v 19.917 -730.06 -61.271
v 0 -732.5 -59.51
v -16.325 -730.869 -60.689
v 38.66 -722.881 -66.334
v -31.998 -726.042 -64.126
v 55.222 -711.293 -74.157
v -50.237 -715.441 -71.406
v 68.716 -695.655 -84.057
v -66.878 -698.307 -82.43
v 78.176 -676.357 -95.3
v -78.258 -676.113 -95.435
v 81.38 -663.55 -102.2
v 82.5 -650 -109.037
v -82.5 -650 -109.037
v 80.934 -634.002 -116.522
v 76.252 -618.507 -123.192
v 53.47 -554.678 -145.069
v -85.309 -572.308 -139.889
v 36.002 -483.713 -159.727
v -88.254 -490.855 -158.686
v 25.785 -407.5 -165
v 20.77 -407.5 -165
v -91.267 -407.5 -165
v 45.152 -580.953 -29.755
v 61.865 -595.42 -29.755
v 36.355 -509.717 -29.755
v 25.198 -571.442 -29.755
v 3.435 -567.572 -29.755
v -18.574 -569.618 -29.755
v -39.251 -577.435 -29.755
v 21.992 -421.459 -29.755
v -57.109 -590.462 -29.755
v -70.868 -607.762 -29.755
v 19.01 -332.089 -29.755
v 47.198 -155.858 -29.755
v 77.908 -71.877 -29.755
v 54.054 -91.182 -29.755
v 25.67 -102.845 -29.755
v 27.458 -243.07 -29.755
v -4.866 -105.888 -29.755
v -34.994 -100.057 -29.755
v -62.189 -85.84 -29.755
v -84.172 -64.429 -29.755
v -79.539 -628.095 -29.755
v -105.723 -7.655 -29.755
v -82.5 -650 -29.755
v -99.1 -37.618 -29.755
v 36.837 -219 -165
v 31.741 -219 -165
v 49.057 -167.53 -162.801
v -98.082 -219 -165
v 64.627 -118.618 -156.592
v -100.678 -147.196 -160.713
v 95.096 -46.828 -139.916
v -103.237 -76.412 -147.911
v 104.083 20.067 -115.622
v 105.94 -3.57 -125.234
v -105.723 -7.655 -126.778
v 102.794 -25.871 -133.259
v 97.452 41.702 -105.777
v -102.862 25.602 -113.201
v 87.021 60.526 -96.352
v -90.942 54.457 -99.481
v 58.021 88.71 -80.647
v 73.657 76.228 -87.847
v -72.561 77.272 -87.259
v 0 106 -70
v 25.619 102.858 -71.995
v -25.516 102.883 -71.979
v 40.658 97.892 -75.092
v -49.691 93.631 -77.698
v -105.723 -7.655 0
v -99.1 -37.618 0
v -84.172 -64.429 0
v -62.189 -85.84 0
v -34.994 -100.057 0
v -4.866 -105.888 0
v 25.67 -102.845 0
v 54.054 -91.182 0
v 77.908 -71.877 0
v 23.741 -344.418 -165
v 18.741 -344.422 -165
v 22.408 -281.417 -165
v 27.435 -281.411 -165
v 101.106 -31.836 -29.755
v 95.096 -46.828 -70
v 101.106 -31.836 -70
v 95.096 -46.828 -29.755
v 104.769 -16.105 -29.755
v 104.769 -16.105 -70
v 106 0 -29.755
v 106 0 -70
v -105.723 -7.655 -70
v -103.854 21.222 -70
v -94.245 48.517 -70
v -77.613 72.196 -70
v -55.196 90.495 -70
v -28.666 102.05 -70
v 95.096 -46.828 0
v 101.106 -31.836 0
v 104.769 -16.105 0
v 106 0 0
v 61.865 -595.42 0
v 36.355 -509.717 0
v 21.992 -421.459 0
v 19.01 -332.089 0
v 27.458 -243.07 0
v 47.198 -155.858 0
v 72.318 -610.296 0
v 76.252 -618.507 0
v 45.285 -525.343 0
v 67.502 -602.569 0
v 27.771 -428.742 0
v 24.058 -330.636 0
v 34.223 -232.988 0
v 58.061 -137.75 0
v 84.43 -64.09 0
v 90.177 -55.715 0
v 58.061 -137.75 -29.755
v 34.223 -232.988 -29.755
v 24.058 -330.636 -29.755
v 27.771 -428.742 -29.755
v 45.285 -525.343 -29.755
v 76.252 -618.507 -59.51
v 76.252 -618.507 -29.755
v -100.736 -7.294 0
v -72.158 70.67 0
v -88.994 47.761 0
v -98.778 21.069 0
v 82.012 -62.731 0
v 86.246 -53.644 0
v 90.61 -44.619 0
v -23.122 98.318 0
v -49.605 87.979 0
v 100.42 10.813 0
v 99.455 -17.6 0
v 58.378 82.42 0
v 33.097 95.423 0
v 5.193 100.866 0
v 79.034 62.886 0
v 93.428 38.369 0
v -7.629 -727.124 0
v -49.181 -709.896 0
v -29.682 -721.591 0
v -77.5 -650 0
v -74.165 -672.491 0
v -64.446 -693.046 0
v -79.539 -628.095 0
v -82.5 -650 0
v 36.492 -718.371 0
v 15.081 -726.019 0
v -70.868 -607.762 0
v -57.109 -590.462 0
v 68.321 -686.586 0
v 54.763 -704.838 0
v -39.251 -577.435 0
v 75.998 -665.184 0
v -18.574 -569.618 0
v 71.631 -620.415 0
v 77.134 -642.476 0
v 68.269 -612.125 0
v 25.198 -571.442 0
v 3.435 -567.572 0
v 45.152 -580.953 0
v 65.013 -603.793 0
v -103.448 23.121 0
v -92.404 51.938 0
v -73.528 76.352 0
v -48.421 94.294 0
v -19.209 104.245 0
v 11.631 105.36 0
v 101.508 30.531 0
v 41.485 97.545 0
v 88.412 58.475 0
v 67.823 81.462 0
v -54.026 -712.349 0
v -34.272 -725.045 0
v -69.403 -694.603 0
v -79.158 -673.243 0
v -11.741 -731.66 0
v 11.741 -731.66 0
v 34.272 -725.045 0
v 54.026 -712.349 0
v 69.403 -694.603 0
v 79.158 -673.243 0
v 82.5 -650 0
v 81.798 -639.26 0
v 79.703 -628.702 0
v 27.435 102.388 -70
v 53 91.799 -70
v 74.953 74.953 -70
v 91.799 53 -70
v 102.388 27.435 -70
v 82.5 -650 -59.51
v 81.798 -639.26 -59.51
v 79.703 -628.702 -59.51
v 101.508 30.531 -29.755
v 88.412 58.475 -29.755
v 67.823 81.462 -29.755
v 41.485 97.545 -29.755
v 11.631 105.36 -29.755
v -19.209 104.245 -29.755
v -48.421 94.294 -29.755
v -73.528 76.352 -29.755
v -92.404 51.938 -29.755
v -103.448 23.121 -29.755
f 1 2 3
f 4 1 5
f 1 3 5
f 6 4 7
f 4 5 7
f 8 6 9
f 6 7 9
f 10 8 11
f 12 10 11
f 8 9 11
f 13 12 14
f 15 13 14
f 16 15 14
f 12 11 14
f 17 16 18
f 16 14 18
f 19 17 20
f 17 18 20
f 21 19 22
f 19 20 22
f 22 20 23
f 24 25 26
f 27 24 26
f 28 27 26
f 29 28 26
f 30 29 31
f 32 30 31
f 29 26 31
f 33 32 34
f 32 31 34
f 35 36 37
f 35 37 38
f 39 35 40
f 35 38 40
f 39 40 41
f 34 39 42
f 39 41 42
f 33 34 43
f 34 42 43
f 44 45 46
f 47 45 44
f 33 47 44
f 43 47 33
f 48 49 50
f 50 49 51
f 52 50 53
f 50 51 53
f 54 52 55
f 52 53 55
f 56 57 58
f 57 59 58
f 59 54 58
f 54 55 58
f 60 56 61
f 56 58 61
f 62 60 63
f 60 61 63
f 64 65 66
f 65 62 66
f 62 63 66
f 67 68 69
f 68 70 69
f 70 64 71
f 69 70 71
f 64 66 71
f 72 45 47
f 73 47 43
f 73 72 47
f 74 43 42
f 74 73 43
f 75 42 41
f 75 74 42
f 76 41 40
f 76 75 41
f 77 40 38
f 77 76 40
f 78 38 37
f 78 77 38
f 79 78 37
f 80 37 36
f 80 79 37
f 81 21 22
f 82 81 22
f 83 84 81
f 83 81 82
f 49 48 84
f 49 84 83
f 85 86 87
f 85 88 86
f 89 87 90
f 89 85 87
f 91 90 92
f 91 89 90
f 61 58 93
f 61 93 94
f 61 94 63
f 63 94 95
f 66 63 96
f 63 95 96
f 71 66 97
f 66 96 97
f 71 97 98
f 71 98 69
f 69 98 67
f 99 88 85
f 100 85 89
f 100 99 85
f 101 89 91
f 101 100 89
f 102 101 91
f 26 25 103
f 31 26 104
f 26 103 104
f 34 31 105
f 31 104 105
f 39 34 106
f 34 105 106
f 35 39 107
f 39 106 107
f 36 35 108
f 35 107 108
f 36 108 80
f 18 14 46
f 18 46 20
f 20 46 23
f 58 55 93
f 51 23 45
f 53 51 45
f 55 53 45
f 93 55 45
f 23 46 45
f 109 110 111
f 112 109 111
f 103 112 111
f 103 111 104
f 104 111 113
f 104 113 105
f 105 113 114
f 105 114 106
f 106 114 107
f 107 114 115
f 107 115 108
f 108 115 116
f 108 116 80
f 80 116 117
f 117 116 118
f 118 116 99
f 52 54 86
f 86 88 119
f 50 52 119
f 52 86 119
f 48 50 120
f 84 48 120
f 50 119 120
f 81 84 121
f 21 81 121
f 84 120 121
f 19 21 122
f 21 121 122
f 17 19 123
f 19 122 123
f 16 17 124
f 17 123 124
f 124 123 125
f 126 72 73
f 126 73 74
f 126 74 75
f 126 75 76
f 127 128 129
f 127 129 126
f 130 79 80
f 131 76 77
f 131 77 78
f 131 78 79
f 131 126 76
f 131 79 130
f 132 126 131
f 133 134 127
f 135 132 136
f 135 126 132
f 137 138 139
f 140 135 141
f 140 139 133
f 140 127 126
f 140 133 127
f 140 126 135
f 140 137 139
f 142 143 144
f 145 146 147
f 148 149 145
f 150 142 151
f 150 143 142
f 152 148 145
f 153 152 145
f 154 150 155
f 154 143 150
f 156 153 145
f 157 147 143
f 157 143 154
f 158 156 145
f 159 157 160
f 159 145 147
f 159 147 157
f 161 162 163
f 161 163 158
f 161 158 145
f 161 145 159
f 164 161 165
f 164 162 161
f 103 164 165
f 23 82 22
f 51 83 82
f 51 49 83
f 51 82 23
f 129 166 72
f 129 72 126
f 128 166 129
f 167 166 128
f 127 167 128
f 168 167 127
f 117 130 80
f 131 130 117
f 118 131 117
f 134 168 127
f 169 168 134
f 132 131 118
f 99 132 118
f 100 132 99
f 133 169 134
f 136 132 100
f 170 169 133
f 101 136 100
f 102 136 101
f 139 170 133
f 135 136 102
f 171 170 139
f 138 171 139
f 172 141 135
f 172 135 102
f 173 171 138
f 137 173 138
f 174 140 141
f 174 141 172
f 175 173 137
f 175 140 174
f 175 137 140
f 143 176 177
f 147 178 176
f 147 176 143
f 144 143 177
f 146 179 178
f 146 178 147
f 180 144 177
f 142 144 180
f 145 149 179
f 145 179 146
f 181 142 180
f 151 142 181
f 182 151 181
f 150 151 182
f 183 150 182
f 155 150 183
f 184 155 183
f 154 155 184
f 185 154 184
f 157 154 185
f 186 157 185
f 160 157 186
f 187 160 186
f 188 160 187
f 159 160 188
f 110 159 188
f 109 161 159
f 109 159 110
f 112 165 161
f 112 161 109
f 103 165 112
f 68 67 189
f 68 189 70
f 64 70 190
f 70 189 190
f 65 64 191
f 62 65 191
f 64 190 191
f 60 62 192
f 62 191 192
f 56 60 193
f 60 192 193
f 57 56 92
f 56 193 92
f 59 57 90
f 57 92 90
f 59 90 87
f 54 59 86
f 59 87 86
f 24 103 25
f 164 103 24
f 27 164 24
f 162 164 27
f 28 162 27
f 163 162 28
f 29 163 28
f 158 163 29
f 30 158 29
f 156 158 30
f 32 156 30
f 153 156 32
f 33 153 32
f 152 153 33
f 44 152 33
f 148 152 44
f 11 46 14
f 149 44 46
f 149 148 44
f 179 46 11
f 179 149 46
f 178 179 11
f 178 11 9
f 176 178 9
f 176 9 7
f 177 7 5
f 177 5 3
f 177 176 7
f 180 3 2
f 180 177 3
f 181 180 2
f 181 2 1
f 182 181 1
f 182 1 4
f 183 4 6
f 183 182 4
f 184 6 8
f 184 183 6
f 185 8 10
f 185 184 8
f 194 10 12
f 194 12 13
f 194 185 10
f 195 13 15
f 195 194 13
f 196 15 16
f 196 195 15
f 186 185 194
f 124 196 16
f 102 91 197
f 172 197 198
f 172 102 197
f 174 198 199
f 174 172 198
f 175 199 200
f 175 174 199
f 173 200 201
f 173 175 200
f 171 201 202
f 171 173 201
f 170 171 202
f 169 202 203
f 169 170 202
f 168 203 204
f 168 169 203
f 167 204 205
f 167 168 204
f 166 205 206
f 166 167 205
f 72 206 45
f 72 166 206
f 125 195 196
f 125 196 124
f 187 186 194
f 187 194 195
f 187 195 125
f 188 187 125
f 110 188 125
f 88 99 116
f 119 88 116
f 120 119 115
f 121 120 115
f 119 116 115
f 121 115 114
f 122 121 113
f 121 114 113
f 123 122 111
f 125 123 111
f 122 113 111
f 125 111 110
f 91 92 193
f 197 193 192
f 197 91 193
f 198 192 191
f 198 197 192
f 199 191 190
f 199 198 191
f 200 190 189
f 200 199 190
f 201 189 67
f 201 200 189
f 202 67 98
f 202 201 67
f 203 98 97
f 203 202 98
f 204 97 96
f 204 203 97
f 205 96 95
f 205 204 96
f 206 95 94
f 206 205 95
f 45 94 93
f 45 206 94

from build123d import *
from build123d.topology import SkipClean

# Parameters (mm, degrees)
SKETCH_1_R               = 106
EXTRUDE_1_DEPTH          = 70
SKETCH_2_R               = 82.5
EXTRUDE_2_DEPTH          = 59.51
EXTRUDE_2_2_DEPTH        = 165
EXTRUDE_3_DEPTH          = 135.245
CUT_EXTRUDE_1_DEPTH      = 759.298918633
CUT_EXTRUDE_1_DEPTH_BACK = 759.298918633


with BuildPart() as part:
    # 草圖1 → 填料-伸長1 (new body)
    with BuildSketch(Plane.XY):
        Circle(SKETCH_1_R)
    extrude(amount=-EXTRUDE_1_DEPTH)



with BuildPart() as body_2:
    # 草圖2 → Extrude 2 (new body)
    with BuildSketch(Plane.XY):
        with Locations((0, -650)):
            Circle(SKETCH_2_R)
    extrude(amount=-EXTRUDE_2_DEPTH)


with BuildPart() as part_1:
    with SkipClean():  # the faces are left unmerged after this step: merging them gives an invalid solid
        add(part.part)

        add(body_2.part)  # Extrude 2 2 merges body 2
        # 草圖5 → Extrude 2 2 (add)
        with BuildSketch(Plane.XY):
            with BuildLine():
                ThreePointArc((-105.723256406, -7.654610039), (20.294582586, 104.039078801), (95.095556669, -46.827717239))
                ThreePointArc((95.095556669, -46.827717239), (24.058429711, -330.636348878), (76.252402834, -618.506809274))
                ThreePointArc((76.252402834, -618.506809274), (16.053453931, -730.923028965), (-82.5, -650))
                Line((-82.5, -650), (-77.5, -650))
                ThreePointArc((-77.5, -650), (15.080517329, -726.018602967), (71.631045086, -620.4154875))
                ThreePointArc((71.631045086, -620.4154875), (19.06114358, -330.471632986), (90.609917204, -44.618862652))
                ThreePointArc((90.609917204, -44.618862652), (19.337290954, 99.131575084), (-100.736310349, -7.293543528))
                Line((-100.736310349, -7.293543528), (-105.723256406, -7.654610039))
            make_face()
        extrude(amount=-EXTRUDE_2_2_DEPTH)

    # 草圖6 → 填料-伸長3 (add)
    with BuildSketch(Plane.XY.offset(-29.755)):
        with BuildLine():
            Line((-82.5, -650), (-105.723256406, -7.654610039))
            ThreePointArc((-105.723256406, -7.654610039), (20.294582586, 104.039078801), (95.095556669, -46.827717239))
            ThreePointArc((95.095556669, -46.827717239), (24.058429711, -330.636348878), (76.252402834, -618.506809274))
            ThreePointArc((76.252402834, -618.506809274), (16.053453931, -730.923028965), (-82.5, -650))
        make_face()
    extrude(amount=-EXTRUDE_3_DEPTH)

    # 草圖7 → 除料-伸長1 (cut, two sides: drawn at the far end of the back side and taken through both)
    with BuildSketch(Plane(origin=(0, 0, 0), x_dir=(0, 0, -1), z_dir=(1, 0, 0)).offset(-CUT_EXTRUDE_1_DEPTH_BACK)):
        with BuildLine():
            Line((165, -732.5), (59.51, -732.5))
            ThreePointArc((59.51, -732.5), (137.967226394, -578.345793115), (165, -407.5))
            Line((165, -407.5), (165, -732.5))
        make_face()
        with BuildLine():
            Line((70, 106), (165, 106))
            Line((165, 106), (165, -219))
            ThreePointArc((165, -219), (140.76325893, -49.699970467), (70, 106))
        make_face()
    extrude(amount=CUT_EXTRUDE_1_DEPTH + CUT_EXTRUDE_1_DEPTH_BACK, mode=Mode.SUBTRACT)


solid = part_1.part
